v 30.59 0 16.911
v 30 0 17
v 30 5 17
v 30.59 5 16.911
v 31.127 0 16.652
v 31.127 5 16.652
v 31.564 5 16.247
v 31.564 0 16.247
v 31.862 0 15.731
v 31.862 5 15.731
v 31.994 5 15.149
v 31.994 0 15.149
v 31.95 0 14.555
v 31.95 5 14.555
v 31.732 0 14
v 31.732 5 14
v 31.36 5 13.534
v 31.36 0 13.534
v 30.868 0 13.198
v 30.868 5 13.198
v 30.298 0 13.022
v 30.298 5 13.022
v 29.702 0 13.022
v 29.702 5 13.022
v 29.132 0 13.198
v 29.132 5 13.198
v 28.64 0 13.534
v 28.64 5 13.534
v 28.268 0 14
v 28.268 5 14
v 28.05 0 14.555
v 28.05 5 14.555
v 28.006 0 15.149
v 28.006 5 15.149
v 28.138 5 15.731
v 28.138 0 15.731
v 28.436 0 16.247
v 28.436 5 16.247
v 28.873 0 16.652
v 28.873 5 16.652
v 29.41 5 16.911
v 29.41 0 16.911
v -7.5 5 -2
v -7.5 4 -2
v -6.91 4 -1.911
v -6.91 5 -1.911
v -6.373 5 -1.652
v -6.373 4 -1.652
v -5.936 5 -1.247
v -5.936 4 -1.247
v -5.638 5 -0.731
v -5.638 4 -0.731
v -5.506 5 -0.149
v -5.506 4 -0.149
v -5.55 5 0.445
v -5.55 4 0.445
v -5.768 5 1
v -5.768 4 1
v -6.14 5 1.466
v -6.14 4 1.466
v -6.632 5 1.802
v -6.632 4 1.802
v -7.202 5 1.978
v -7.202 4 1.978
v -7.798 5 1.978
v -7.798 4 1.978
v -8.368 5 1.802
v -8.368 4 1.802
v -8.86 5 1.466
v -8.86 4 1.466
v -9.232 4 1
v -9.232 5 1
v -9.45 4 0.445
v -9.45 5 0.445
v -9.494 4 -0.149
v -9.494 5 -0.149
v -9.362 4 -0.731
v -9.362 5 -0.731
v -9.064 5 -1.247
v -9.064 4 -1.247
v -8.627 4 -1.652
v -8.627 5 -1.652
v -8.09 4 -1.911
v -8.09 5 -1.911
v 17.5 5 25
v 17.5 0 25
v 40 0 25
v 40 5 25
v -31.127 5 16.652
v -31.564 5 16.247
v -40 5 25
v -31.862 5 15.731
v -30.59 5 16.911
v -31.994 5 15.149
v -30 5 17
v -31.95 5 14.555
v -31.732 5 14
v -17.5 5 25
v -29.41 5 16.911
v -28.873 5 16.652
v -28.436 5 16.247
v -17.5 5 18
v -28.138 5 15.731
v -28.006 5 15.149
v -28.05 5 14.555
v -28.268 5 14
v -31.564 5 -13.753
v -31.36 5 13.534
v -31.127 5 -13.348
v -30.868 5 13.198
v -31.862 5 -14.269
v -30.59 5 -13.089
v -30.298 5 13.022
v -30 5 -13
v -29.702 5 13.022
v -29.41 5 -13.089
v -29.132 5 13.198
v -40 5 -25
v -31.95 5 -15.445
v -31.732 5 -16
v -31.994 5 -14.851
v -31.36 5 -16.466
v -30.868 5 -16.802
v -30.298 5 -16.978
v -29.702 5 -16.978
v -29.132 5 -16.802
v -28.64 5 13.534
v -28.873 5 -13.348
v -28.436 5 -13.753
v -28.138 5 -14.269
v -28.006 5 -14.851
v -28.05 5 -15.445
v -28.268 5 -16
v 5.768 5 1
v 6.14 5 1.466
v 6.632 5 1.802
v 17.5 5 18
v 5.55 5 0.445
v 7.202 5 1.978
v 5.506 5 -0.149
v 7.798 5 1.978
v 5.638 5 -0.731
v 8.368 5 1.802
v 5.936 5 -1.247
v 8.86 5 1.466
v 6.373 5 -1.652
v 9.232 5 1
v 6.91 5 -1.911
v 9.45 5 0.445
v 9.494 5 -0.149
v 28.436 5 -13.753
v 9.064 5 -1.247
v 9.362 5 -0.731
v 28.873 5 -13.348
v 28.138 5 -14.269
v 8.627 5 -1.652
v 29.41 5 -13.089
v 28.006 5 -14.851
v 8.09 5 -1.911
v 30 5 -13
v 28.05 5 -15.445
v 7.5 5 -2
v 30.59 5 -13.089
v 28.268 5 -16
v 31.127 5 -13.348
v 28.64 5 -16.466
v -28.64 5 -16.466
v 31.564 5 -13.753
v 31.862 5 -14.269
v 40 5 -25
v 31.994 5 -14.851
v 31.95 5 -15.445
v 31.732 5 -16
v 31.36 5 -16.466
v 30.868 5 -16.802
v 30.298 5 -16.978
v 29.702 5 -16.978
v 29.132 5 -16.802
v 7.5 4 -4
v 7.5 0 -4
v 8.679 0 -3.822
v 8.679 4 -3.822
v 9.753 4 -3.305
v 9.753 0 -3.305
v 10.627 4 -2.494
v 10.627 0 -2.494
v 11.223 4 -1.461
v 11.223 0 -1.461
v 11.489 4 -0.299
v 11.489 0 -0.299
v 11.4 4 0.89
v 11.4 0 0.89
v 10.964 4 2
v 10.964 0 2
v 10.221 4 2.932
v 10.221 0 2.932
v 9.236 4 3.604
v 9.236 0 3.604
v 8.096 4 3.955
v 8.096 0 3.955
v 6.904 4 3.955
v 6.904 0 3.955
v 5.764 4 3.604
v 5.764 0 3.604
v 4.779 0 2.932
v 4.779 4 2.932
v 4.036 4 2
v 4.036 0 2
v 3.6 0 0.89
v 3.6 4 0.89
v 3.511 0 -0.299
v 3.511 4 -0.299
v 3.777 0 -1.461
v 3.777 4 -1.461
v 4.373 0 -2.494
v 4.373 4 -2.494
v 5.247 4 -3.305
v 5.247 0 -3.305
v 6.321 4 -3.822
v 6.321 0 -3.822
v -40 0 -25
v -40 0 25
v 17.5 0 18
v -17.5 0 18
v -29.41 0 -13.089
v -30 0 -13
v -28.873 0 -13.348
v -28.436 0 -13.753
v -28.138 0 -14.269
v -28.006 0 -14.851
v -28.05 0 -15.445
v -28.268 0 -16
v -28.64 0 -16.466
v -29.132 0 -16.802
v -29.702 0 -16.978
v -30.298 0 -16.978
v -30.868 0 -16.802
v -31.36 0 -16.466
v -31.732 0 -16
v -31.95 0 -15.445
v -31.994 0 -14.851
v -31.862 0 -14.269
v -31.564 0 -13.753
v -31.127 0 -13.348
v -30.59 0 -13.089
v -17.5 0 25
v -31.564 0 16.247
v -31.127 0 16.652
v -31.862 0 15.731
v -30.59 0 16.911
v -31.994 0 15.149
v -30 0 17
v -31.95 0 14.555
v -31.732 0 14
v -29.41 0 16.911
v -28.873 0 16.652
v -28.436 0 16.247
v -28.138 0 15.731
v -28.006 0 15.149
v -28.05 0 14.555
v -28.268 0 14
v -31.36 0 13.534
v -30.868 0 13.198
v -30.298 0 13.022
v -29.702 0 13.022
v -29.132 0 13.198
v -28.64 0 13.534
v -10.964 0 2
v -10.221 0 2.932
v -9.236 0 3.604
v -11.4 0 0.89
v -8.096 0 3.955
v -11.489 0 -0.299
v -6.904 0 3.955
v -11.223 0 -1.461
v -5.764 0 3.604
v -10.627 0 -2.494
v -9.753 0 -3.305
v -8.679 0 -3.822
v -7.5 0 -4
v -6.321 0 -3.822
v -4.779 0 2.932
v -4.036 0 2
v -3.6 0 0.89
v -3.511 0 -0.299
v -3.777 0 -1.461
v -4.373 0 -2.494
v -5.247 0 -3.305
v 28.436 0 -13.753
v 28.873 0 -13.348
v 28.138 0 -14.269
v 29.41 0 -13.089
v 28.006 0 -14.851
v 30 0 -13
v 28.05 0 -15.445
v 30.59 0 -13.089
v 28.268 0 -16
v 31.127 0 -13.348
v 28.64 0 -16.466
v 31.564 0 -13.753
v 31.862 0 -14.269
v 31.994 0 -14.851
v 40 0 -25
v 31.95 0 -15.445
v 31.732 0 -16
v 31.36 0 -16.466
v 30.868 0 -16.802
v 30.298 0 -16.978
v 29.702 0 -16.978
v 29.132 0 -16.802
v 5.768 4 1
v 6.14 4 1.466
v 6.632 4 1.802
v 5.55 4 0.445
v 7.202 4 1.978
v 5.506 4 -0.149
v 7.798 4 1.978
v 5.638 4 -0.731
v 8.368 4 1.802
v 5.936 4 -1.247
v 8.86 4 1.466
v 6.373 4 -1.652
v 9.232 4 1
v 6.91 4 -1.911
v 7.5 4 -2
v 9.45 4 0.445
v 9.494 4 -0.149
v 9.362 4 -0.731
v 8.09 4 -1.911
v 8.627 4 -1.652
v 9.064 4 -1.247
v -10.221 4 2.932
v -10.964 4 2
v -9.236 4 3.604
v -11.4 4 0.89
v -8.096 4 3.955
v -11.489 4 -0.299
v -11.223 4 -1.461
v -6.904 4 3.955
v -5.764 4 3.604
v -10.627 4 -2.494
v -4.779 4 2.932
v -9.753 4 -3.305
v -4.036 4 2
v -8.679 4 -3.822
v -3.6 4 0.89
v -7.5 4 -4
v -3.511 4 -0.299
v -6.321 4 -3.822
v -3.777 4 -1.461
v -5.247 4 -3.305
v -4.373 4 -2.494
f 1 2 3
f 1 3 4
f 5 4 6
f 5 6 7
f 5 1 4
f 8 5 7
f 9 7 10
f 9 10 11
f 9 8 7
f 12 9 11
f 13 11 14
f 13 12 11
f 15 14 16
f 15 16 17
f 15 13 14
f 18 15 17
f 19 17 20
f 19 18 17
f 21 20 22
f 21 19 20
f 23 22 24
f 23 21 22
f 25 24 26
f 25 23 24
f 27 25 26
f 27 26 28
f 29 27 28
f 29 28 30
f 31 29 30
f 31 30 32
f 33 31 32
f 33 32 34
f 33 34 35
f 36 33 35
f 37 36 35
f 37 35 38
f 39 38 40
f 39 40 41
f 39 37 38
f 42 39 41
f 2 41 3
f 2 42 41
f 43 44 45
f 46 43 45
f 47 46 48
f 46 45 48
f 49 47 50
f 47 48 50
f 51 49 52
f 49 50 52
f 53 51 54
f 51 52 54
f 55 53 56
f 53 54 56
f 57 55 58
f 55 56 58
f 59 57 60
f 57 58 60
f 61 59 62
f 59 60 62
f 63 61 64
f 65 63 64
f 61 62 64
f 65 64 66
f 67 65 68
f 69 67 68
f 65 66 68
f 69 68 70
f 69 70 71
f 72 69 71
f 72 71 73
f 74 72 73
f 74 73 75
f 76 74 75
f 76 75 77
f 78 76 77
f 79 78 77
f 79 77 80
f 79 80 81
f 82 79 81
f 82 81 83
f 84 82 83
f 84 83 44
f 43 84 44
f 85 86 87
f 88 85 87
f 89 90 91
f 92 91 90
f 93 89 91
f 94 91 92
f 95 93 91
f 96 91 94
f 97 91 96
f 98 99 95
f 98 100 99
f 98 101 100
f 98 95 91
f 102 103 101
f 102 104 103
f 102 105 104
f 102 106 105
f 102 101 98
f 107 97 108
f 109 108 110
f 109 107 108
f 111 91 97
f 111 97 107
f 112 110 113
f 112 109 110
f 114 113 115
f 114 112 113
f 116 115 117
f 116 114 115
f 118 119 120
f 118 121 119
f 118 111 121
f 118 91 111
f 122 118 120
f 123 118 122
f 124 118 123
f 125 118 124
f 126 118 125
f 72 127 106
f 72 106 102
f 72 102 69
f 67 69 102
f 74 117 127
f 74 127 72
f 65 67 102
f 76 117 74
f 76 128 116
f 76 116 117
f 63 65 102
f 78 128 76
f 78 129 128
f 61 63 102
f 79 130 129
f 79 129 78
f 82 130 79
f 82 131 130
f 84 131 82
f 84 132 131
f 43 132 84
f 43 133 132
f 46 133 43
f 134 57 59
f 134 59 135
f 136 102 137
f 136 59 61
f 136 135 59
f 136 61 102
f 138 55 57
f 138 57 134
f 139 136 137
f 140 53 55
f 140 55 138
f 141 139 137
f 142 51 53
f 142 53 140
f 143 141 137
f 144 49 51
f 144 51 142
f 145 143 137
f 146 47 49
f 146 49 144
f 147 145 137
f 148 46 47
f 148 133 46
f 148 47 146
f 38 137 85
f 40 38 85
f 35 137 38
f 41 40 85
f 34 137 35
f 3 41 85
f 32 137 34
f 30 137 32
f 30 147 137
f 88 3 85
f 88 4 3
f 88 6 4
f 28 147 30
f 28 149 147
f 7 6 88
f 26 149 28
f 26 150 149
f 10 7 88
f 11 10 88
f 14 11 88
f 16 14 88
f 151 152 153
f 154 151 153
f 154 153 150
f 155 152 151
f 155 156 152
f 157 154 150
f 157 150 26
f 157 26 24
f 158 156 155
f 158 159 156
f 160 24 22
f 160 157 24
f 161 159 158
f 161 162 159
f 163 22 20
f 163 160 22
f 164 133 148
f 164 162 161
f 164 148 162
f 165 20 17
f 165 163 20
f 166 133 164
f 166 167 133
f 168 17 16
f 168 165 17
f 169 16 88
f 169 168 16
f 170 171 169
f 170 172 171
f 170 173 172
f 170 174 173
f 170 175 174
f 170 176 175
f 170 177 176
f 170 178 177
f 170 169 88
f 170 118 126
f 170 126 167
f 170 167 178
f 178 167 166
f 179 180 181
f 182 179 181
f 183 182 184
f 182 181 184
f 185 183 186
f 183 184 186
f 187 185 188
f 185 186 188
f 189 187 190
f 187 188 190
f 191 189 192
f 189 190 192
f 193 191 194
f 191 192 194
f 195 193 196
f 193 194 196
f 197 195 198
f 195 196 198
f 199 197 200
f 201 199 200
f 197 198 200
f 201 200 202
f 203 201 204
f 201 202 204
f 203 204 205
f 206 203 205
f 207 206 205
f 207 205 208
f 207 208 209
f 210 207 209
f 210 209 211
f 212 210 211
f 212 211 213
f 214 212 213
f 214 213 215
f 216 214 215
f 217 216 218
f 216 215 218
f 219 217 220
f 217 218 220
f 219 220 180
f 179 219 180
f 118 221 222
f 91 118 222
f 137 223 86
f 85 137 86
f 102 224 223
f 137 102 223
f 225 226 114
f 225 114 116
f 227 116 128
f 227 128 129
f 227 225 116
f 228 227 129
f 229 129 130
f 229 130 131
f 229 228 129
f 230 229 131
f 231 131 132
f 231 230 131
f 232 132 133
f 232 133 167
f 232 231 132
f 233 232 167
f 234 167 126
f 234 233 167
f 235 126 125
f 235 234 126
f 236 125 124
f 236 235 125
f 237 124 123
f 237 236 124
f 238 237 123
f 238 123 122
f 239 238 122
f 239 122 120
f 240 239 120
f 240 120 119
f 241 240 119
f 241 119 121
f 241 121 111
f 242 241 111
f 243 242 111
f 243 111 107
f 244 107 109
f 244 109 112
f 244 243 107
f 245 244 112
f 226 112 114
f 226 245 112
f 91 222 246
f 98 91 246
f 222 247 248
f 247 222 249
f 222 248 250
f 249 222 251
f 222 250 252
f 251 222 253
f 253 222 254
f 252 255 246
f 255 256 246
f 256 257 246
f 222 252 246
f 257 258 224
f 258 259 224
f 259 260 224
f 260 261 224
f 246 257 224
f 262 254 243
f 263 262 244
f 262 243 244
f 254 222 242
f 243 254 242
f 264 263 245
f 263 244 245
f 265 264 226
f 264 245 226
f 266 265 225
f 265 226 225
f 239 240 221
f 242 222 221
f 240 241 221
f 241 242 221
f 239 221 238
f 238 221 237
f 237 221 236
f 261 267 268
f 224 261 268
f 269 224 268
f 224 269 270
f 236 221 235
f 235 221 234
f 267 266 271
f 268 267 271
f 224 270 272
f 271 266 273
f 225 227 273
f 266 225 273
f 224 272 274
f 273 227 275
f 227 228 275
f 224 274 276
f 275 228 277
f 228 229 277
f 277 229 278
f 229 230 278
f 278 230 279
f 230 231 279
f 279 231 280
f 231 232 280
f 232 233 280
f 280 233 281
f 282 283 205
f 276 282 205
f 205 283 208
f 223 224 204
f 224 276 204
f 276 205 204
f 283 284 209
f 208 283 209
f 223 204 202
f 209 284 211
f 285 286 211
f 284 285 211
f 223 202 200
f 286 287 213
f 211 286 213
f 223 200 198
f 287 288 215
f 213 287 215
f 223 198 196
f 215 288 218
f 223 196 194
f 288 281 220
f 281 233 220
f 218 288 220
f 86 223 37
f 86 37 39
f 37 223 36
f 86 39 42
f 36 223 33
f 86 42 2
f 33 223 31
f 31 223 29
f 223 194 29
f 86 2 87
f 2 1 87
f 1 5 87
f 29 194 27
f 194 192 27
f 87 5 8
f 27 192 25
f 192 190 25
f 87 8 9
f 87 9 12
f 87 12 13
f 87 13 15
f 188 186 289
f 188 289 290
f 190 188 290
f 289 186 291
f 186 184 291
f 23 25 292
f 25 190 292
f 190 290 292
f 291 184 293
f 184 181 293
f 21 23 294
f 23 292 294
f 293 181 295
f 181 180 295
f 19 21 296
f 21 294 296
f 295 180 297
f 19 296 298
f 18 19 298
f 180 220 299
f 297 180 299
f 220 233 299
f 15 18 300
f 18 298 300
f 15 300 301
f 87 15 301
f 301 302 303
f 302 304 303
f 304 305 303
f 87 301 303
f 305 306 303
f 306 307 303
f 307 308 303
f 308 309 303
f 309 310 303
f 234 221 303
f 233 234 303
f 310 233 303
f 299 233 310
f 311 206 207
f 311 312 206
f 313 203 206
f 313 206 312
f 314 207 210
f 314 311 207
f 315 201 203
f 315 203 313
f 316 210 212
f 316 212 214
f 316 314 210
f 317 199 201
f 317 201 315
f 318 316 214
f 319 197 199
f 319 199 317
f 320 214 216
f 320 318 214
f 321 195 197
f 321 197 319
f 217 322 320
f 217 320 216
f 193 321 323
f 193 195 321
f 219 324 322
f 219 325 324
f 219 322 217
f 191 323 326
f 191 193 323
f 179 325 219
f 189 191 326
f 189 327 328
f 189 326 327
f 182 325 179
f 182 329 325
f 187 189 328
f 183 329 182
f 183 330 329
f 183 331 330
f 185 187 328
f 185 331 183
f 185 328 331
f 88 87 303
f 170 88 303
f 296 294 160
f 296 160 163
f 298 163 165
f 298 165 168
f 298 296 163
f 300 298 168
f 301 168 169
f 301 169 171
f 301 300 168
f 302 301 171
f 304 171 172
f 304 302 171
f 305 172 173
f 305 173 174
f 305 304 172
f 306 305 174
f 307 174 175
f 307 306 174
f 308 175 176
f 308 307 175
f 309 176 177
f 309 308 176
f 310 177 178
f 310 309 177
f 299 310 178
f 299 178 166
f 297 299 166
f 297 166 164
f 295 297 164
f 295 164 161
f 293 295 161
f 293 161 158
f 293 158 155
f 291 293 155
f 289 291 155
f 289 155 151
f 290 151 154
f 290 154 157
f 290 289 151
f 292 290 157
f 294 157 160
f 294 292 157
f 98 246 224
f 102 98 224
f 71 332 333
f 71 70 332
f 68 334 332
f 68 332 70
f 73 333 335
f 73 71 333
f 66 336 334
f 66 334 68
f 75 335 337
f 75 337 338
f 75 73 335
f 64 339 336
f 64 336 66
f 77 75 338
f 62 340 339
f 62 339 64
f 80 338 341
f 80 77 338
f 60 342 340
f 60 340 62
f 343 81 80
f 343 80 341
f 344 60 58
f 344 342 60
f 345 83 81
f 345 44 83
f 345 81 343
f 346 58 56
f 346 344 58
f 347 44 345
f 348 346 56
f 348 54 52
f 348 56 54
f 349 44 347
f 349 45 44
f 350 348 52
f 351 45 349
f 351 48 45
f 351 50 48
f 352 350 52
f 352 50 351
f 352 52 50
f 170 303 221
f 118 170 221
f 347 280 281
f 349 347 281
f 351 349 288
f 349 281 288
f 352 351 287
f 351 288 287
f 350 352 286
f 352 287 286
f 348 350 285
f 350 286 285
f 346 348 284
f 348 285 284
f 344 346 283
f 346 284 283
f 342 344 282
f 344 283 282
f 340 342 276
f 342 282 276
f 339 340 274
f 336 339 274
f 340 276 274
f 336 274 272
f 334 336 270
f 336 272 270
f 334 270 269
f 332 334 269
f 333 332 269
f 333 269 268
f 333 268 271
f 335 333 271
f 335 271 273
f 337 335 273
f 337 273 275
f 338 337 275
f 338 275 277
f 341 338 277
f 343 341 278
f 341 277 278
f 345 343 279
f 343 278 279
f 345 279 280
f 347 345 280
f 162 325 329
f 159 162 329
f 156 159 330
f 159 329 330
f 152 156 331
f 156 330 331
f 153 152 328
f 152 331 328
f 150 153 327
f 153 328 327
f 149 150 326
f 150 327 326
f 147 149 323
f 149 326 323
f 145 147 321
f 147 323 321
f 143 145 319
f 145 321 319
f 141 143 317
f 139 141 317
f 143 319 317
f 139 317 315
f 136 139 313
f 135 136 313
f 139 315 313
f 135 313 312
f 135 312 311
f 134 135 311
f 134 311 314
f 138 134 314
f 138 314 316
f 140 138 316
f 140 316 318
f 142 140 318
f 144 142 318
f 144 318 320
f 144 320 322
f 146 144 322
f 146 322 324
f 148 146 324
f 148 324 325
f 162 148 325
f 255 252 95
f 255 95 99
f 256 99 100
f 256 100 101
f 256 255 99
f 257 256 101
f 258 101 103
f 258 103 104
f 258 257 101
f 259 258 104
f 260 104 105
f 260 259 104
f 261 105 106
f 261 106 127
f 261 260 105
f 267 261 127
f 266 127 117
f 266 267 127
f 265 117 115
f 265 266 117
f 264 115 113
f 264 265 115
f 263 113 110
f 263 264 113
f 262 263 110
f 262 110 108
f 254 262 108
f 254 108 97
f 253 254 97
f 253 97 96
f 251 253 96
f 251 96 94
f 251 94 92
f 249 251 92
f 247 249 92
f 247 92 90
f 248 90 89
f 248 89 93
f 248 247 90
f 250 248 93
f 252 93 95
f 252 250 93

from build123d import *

# Parameters (mm, degrees)
SKETCH1_R           = 2
BOSS_EXTRUDE1_DEPTH = 5
SKETCH2_R           = 4
CUT_EXTRUDE1_DEPTH  = 4
SKETCH2_4_R         = 2
CUT_EXTRUDE2_DEPTH  = 48.434164903


with BuildPart() as part:
    # Sketch1 → Boss-Extrude1 (new body)
    with BuildSketch(Plane(origin=(0, 0, 0), x_dir=(1, 0, 0), z_dir=(0, 1, 0))):
        Polygon((-40, -25), (-17.5, -25), (-17.5, -18), (17.5, -18), (17.5, -25), (40, -25), (40, 25), (-40, 25), align=None)
        with Locations((-30, -15)):
            Circle(SKETCH1_R, mode=Mode.SUBTRACT)
        with Locations((30, -15)):
            Circle(SKETCH1_R, mode=Mode.SUBTRACT)
        with Locations((-30, 15)):
            Circle(SKETCH1_R, mode=Mode.SUBTRACT)
        with Locations((30, 15)):
            Circle(SKETCH1_R, mode=Mode.SUBTRACT)
    extrude(amount=BOSS_EXTRUDE1_DEPTH)

    # Sketch2 → Cut-Extrude1 (cut)
    with BuildSketch(Plane.XZ):
        with Locations((-7.5, 0)):
            Circle(SKETCH2_R)
        with Locations((7.5, 0)):
            Circle(SKETCH2_R)
    extrude(amount=-CUT_EXTRUDE1_DEPTH, mode=Mode.SUBTRACT)

    # Sketch2<4> → Cut-Extrude2 (cut, through all)
    with BuildSketch(Plane.XZ):
        with Locations((-7.5, 0)):
            Circle(SKETCH2_4_R)
        with Locations((7.5, 0)):
            Circle(SKETCH2_4_R)
    extrude(amount=-CUT_EXTRUDE2_DEPTH, mode=Mode.SUBTRACT)


solid = part.part
